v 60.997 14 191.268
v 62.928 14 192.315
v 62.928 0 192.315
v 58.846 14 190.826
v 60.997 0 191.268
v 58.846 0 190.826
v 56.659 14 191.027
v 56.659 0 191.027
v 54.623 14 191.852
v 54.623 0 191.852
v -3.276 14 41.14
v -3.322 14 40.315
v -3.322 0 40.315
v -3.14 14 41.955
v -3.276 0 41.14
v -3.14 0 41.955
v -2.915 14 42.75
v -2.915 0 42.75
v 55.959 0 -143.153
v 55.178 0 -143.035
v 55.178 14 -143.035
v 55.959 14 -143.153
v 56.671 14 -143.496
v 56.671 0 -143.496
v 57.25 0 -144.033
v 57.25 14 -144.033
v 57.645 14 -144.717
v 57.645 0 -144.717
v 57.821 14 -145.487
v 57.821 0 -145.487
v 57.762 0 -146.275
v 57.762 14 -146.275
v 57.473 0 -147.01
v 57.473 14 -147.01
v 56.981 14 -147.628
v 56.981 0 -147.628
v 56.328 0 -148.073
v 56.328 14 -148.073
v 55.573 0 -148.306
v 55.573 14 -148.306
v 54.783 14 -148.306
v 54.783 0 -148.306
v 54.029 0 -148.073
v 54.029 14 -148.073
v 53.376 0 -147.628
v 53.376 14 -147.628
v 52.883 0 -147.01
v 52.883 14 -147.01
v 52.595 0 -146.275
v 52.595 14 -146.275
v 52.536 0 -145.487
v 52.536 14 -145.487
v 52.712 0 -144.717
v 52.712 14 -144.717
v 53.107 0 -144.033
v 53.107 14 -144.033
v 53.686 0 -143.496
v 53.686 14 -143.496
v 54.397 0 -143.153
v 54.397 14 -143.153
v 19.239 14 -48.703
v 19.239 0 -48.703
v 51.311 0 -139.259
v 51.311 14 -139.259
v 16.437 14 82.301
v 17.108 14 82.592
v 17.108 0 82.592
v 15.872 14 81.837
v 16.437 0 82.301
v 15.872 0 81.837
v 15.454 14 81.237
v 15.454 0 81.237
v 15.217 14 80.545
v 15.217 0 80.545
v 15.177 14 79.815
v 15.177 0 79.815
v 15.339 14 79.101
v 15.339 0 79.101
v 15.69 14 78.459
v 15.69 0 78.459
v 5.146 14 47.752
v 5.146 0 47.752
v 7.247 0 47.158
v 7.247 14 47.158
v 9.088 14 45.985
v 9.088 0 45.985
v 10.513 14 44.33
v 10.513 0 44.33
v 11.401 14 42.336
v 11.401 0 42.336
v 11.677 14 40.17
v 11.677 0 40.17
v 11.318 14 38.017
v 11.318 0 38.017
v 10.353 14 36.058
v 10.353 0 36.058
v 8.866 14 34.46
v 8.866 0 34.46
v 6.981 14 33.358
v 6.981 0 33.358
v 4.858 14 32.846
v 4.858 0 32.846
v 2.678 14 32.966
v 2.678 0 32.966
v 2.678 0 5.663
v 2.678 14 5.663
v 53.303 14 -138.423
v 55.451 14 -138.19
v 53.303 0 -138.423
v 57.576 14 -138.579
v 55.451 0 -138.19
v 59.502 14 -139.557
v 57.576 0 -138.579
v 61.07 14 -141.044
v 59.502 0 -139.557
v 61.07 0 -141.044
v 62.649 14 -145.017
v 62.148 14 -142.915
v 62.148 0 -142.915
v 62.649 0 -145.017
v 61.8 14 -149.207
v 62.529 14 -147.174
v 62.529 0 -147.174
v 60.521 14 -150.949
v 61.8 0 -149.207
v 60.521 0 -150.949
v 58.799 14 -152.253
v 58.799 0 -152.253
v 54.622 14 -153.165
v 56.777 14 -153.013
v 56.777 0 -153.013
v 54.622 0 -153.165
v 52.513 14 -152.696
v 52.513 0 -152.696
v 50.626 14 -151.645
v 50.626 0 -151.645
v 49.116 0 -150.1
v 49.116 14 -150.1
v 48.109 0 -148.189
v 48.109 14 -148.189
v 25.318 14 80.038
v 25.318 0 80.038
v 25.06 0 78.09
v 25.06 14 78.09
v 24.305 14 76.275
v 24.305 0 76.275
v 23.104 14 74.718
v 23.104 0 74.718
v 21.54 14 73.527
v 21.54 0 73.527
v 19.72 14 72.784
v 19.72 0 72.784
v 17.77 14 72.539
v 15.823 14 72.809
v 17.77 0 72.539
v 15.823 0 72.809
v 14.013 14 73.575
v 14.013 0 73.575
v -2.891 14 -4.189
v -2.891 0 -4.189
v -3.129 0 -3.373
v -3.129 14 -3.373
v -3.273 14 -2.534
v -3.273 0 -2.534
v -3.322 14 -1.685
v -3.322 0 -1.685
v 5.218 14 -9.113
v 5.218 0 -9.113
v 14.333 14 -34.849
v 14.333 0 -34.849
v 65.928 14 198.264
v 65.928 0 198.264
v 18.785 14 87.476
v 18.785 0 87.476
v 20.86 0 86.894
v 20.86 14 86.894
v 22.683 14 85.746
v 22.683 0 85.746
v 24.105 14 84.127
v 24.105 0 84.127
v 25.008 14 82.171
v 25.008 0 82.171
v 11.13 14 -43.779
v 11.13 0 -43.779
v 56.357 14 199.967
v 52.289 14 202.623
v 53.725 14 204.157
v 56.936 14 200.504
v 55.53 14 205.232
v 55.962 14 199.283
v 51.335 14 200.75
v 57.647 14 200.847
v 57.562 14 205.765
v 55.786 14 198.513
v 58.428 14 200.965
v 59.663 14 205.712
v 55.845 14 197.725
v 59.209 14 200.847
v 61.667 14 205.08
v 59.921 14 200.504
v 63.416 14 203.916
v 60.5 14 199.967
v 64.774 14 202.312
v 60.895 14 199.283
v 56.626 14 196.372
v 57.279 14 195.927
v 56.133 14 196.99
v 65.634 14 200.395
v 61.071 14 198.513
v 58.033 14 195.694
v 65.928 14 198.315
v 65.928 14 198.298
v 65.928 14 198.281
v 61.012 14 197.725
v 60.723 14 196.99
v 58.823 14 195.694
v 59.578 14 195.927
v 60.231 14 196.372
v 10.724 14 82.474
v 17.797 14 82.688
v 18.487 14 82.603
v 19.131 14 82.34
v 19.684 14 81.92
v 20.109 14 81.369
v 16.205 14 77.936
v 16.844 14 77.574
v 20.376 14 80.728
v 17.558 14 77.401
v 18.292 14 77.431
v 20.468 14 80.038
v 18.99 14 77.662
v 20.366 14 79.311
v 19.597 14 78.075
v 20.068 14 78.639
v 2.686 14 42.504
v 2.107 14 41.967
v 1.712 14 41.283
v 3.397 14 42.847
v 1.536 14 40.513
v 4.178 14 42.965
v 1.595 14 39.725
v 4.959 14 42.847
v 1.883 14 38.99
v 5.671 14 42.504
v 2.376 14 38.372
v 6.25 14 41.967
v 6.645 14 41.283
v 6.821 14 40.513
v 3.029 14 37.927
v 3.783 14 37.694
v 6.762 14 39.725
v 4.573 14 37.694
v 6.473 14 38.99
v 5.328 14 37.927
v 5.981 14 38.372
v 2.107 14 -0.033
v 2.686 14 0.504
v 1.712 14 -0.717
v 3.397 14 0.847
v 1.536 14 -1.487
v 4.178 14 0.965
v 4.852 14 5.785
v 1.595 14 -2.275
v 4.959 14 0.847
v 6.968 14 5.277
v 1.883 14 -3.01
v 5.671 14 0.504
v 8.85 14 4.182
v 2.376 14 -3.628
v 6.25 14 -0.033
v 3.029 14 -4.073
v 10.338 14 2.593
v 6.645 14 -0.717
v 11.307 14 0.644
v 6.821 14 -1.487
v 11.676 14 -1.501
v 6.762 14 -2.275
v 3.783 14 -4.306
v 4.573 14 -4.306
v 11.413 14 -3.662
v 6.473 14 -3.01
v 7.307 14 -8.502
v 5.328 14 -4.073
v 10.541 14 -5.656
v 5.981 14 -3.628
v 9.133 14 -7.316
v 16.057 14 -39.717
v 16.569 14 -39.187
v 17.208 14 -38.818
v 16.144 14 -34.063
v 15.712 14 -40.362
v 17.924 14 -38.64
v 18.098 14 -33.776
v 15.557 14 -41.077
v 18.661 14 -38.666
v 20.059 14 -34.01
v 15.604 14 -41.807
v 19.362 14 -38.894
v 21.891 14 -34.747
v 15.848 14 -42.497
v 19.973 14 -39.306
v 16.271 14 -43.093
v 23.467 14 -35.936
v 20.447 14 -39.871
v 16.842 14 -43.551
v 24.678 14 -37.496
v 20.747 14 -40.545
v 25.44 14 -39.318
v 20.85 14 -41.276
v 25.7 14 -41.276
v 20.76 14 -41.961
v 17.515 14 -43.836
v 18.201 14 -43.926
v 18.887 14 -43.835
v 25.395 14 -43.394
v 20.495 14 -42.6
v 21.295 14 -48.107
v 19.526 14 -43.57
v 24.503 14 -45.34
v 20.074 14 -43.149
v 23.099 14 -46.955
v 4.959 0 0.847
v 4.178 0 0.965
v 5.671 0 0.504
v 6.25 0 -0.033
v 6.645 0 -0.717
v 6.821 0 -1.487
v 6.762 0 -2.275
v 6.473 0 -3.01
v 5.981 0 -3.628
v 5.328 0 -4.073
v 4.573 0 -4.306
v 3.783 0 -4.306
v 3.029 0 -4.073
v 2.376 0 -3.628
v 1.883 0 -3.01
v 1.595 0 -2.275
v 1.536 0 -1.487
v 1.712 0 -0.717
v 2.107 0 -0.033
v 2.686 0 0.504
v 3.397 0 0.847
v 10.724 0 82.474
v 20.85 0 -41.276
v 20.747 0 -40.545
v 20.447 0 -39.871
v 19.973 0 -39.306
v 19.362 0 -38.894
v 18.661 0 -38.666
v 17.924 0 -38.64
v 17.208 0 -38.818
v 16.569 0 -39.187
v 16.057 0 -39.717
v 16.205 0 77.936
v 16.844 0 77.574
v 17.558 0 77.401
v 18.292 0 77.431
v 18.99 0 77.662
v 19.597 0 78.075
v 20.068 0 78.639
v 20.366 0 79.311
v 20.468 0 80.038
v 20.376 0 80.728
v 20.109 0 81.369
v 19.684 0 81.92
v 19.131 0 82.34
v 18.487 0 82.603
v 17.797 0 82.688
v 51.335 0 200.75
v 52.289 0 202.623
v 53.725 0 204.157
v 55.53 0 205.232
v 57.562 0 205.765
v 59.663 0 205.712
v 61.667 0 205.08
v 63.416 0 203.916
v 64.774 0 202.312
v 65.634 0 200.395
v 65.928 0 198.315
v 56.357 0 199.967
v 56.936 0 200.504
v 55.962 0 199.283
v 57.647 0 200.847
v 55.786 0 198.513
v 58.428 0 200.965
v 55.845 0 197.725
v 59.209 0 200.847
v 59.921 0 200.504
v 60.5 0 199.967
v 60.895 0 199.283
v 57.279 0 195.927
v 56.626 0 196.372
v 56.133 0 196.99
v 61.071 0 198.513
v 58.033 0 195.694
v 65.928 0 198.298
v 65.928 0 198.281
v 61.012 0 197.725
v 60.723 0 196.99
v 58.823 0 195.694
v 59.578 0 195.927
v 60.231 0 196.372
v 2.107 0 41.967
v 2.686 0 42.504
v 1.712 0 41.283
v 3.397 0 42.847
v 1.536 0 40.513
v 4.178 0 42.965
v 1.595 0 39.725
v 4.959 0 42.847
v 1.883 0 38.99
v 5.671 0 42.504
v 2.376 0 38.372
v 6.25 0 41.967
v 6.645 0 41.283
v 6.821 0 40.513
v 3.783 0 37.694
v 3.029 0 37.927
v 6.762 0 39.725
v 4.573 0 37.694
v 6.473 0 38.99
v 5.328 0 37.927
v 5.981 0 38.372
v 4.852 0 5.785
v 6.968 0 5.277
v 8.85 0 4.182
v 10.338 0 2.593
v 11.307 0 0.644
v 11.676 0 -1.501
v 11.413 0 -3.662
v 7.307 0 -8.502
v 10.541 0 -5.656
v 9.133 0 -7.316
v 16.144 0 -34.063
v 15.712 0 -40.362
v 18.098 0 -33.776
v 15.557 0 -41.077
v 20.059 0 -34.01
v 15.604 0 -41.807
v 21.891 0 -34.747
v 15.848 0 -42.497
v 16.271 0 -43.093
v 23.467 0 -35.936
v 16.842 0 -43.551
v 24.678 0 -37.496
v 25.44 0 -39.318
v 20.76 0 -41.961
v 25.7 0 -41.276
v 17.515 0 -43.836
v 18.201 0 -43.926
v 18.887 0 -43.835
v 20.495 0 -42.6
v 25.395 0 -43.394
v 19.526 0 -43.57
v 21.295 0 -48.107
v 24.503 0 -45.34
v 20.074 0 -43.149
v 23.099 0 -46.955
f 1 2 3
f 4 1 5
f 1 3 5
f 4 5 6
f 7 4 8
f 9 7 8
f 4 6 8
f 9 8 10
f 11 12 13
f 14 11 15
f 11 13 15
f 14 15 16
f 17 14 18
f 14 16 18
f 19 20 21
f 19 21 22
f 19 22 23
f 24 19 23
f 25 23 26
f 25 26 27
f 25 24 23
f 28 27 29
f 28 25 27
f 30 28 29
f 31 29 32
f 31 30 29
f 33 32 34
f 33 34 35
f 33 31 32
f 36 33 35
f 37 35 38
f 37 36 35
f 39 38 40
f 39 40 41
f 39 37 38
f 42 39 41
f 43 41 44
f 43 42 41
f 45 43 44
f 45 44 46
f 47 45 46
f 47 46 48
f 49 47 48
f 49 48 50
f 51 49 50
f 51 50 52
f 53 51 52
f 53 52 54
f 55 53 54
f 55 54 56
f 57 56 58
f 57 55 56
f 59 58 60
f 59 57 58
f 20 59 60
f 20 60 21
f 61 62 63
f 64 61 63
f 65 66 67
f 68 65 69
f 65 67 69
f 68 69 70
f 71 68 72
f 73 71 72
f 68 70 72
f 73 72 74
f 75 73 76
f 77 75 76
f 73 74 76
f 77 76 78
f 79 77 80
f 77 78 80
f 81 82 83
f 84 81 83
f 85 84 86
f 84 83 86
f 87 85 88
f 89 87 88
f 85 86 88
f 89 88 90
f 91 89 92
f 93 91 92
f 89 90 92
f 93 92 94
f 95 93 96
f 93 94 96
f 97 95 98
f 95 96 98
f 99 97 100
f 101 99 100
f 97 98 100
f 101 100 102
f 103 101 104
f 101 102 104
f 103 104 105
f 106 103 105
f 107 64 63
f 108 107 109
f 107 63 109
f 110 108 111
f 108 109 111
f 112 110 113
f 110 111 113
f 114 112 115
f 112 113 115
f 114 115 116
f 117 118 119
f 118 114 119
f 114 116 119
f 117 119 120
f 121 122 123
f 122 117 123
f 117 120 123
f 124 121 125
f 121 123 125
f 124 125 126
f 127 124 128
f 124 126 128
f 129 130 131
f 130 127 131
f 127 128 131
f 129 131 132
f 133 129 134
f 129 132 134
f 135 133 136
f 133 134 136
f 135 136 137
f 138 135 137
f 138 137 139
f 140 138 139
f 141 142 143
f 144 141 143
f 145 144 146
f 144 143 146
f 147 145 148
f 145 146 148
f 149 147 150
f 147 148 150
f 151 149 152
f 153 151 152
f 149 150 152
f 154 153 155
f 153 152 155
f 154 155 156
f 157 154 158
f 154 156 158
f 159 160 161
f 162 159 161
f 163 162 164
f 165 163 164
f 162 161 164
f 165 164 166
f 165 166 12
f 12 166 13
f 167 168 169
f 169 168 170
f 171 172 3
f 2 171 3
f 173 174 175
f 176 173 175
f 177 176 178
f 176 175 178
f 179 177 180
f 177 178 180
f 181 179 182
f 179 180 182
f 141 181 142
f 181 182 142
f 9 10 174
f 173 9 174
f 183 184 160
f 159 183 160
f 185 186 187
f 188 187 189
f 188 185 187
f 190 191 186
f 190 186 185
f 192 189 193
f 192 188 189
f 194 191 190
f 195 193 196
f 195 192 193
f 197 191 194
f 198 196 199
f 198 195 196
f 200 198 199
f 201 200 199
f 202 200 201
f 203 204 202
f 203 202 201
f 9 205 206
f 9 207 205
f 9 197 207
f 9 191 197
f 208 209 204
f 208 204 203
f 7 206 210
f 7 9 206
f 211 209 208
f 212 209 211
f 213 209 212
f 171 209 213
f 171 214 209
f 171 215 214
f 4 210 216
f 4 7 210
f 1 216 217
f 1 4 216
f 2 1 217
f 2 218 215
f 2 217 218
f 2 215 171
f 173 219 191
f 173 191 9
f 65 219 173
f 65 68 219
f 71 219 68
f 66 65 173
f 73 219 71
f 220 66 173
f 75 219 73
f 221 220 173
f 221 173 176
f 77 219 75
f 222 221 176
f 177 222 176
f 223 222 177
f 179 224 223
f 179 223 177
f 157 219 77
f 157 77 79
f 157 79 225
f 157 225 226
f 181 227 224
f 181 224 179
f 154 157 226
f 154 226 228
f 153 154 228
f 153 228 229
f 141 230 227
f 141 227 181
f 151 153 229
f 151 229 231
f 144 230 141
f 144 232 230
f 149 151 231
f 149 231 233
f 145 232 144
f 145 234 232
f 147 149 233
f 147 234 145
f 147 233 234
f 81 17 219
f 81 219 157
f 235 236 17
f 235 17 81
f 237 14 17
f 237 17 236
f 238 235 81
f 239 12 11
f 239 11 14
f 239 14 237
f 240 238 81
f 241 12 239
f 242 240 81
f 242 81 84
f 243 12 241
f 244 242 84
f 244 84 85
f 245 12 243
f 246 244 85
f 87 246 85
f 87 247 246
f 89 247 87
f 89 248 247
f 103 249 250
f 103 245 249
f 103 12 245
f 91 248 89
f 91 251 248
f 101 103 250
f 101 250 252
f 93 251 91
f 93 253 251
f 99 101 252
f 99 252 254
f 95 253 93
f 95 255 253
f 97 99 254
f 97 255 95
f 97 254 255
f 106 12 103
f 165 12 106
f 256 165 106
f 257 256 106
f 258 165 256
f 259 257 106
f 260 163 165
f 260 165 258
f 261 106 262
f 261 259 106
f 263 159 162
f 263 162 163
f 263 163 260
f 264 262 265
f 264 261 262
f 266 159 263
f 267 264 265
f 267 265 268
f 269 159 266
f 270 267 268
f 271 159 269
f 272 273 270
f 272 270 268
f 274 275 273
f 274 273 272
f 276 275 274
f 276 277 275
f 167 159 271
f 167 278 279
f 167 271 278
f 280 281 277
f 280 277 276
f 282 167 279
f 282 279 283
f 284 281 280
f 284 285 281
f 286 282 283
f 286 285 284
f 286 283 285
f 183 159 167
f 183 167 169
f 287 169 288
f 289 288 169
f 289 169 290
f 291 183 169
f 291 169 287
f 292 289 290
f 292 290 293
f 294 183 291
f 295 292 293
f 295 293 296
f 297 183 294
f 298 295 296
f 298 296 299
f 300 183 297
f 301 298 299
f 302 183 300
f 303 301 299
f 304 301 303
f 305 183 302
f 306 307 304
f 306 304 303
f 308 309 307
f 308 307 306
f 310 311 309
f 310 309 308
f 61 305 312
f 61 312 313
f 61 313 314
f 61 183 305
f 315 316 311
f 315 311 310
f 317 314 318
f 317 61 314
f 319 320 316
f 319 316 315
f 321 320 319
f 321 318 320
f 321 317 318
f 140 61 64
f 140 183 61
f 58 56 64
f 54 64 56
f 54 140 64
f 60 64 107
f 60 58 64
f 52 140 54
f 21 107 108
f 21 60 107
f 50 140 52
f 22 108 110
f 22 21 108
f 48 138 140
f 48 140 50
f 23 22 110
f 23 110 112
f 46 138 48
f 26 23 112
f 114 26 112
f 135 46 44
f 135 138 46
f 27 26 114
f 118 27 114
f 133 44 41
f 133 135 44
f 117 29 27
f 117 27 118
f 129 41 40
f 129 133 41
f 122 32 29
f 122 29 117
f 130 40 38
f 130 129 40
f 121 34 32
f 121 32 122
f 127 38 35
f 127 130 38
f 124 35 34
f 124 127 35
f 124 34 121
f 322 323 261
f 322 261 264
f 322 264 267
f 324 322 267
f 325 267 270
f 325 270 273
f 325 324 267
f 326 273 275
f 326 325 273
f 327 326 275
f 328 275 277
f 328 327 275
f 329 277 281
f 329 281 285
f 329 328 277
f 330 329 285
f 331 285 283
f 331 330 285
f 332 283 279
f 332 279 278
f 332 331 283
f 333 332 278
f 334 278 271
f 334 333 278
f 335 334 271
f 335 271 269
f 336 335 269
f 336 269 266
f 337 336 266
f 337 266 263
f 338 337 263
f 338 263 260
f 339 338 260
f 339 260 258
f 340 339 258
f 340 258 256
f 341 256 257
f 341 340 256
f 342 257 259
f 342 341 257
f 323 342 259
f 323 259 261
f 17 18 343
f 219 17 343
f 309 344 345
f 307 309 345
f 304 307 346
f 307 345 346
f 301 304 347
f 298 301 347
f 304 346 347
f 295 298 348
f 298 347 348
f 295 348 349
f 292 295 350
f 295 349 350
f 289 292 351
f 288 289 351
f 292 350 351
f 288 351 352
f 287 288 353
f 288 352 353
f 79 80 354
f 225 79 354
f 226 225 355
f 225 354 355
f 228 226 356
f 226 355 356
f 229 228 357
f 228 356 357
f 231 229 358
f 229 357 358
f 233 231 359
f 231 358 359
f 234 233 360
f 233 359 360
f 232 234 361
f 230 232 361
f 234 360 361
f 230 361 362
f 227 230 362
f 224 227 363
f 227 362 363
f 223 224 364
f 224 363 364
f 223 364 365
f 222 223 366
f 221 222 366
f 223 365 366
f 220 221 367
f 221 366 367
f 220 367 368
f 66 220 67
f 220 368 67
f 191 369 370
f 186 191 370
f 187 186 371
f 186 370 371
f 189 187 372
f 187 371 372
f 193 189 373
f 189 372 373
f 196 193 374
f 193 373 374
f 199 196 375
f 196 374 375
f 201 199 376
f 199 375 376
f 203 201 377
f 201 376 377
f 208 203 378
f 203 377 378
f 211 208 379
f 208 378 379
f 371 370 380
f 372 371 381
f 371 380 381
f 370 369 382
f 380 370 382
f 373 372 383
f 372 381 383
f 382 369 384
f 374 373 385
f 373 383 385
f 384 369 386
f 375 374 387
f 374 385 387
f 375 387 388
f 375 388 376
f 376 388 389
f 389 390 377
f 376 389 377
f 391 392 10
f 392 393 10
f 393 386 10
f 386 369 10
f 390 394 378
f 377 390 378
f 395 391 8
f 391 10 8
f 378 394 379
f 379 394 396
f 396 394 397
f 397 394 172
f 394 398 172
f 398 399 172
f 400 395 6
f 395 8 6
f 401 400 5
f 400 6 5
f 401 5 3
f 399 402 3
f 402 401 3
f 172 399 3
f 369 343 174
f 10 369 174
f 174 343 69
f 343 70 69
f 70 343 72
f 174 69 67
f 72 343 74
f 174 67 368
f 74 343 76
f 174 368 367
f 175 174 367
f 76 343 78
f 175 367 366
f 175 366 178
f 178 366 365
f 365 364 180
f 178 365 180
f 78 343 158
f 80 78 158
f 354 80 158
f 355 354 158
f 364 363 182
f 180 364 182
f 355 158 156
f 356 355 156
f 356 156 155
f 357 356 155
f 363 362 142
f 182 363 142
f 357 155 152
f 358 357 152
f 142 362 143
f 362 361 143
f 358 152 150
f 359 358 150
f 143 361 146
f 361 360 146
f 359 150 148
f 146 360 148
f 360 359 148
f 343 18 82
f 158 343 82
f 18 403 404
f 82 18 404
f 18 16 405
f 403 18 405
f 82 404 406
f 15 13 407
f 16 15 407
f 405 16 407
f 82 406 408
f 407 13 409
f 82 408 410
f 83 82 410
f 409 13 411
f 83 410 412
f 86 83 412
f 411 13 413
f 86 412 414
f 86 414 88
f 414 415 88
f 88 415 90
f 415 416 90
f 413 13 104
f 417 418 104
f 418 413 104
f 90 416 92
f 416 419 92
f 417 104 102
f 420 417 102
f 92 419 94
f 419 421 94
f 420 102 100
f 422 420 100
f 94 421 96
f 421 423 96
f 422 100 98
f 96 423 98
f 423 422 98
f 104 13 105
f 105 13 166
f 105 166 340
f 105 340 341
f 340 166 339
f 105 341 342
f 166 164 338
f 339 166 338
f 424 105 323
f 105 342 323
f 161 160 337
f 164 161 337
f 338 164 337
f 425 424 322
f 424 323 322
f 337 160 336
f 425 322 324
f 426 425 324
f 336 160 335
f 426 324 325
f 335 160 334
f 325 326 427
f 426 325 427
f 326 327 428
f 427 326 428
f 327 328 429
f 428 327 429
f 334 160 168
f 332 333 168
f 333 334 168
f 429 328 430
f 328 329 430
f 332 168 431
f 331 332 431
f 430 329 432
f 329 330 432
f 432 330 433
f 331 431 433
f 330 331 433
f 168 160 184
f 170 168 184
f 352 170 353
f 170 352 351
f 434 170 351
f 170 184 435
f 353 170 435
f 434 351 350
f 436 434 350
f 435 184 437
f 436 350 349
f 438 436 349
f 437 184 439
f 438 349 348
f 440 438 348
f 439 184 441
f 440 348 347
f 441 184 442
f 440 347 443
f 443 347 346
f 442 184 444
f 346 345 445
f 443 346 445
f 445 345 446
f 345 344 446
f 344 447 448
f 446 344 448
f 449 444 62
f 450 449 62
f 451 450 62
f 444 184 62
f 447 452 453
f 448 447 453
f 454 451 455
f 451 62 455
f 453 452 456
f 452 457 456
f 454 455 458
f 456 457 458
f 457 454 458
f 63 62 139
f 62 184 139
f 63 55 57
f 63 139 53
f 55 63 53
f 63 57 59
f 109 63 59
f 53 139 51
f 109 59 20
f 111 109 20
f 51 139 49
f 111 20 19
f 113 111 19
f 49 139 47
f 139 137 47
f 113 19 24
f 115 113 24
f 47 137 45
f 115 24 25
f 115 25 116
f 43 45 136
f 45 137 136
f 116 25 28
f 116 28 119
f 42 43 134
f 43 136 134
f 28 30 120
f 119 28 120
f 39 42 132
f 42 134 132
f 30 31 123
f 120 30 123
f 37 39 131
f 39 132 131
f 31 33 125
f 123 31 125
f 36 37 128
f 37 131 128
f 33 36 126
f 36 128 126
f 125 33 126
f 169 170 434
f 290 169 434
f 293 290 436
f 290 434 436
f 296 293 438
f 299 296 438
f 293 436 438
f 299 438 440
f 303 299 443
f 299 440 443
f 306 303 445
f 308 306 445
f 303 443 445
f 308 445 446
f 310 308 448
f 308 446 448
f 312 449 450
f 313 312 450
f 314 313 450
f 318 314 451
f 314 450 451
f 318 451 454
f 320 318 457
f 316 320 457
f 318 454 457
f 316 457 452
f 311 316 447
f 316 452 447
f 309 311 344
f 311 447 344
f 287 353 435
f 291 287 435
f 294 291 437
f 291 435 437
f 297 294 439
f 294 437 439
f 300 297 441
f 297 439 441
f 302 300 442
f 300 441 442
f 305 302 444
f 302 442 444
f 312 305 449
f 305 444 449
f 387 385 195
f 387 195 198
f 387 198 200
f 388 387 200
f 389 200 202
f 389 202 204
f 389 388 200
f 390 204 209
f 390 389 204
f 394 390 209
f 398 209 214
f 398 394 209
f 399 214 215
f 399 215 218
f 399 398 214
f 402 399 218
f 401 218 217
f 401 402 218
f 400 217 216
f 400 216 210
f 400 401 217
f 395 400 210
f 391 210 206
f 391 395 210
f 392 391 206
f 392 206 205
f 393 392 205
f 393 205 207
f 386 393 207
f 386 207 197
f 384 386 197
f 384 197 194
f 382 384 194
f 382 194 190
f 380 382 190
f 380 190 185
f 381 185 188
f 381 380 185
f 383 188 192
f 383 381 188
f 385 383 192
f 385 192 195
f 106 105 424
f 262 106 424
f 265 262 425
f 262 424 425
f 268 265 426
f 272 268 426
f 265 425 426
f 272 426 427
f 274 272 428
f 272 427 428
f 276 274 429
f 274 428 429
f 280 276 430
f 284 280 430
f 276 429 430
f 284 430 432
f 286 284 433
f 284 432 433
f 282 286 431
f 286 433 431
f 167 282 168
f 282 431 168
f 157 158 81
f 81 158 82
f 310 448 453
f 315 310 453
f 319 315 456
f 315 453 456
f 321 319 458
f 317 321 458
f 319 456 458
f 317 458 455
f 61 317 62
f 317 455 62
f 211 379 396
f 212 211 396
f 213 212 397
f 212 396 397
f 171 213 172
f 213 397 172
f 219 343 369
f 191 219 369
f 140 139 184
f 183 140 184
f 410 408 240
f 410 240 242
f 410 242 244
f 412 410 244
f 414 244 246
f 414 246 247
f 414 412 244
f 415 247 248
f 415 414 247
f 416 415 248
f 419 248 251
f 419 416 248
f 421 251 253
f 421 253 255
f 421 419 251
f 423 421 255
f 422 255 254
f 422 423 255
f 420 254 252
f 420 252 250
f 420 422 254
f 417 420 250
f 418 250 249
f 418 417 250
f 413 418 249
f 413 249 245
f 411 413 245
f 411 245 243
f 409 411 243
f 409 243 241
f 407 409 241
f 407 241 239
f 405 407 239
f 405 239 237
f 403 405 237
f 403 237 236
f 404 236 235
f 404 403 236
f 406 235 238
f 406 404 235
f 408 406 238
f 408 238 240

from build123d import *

# Parameters (mm, degrees)
SKETCH1_R           = 2.65
SKETCH1_R_2         = 7.5
BOSS_EXTRUDE2_DEPTH = 14


with BuildPart() as part:
    # Sketch1 → Boss-Extrude2 (new body)
    # profile 1 of 17: a face of its own
    with BuildSketch(Plane(origin=(0, 0, 0), x_dir=(1, 0, 0), z_dir=(0, 1, 0))):
        with BuildLine():
            ThreePointArc((54.623301063, -191.851720312), (51.393371136, -195.715064378), (51.3348715, -200.750384875))
            ThreePointArc((51.3348715, -200.750384875), (59.663021267, -205.712476174), (65.928383174, -198.314796214))
            ThreePointArc((65.928383174, -198.314796214), (65.928340244, -198.289420057), (65.928211455, -198.26404419))
            Line((65.928211455, -198.26404419), (62.928383174, -192.314796214))
            ThreePointArc((62.928383174, -192.314796214), (58.845920647, -190.826427737), (54.623301063, -191.851720312))
        make_face()
        with Locations(Location((58.428383174, -198.314796214, 0), (0, 0, 270))):
            Circle(SKETCH1_R, mode=Mode.SUBTRACT)
    # profile 2 of 17: a face of its own
    with BuildSketch(Plane(origin=(0, 0, 0), x_dir=(1, 0, 0), z_dir=(0, 1, 0))):
        with BuildLine():
            ThreePointArc((18.785357114, -87.475772959), (13.863470513, -86.411391053), (10.724167872, -82.474049884))
            Line((10.724167872, -82.474049884), (51.3348715, -200.750384875))
            ThreePointArc((51.3348715, -200.750384875), (51.393371136, -195.715064378), (54.623301063, -191.851720312))
            Line((54.623301063, -191.851720312), (18.785357114, -87.475772959))
        make_face()
    # profile 3 of 17: a face of its own
    with BuildSketch(Plane(origin=(0, 0, 0), x_dir=(1, 0, 0), z_dir=(0, 1, 0))):
        with BuildLine():
            ThreePointArc((14.012597561, -73.575385689), (10.782667702, -77.438729573), (10.724167872, -82.474049884))
            ThreePointArc((10.724167872, -82.474049884), (13.863470513, -86.411391053), (18.785357114, -87.475772959))
            Line((18.785357114, -87.475772959), (17.1084173, -82.591782349))
            ThreePointArc((17.1084173, -82.591782349), (15.311305548, -80.899036252), (15.689537375, -78.459376299))
            Line((15.689537375, -78.459376299), (14.012597561, -73.575385689))
        make_face()
    # profile 4 of 17: a face of its own
    with BuildSketch(Plane(origin=(0, 0, 0), x_dir=(1, 0, 0), z_dir=(0, 1, 0))):
        with BuildLine():
            ThreePointArc((25.317679673, -80.038461592), (21.540036733, -73.527389644), (14.012597561, -73.575385689))
            Line((14.012597561, -73.575385689), (15.689537375, -78.459376299))
            ThreePointArc((15.689537375, -78.459376299), (18.649221287, -77.522306083), (20.467679673, -80.038461592))
            ThreePointArc((20.467679673, -80.038461592), (19.421262336, -82.148206279), (17.1084173, -82.591782349))
            Line((17.1084173, -82.591782349), (18.785357114, -87.475772959))
            ThreePointArc((18.785357114, -87.475772959), (23.452729842, -84.987826157), (25.317679673, -80.038461592))
        make_face()
    # profile 5 of 17: a face of its own
    with BuildSketch(Plane(origin=(0, 0, 0), x_dir=(1, 0, 0), z_dir=(0, 1, 0))):
        with BuildLine():
            ThreePointArc((14.012597561, -73.575385689), (10.782667702, -77.438729573), (10.724167872, -82.474049884))
            ThreePointArc((10.724167872, -82.474049884), (13.863470513, -86.411391053), (18.785357114, -87.475772959))
            Line((18.785357114, -87.475772959), (17.1084173, -82.591782349))
            ThreePointArc((17.1084173, -82.591782349), (15.311305548, -80.899036252), (15.689537375, -78.459376299))
            Line((15.689537375, -78.459376299), (14.012597561, -73.575385689))
        make_face()
    # profile 6 of 17: a face of its own
    with BuildSketch(Plane(origin=(0, 0, 0), x_dir=(1, 0, 0), z_dir=(0, 1, 0))):
        with BuildLine():
            ThreePointArc((25.317679673, -80.038461592), (21.540036733, -73.527389644), (14.012597561, -73.575385689))
            Line((14.012597561, -73.575385689), (15.689537375, -78.459376299))
            ThreePointArc((15.689537375, -78.459376299), (18.649221287, -77.522306083), (20.467679673, -80.038461592))
            ThreePointArc((20.467679673, -80.038461592), (19.421262336, -82.148206279), (17.1084173, -82.591782349))
            Line((17.1084173, -82.591782349), (18.785357114, -87.475772959))
            ThreePointArc((18.785357114, -87.475772959), (23.452729842, -84.987826157), (25.317679673, -80.038461592))
        make_face()
    # profile 7 of 17: a face of its own
    with BuildSketch(Plane(origin=(0, 0, 0), x_dir=(1, 0, 0), z_dir=(0, 1, 0))):
        with BuildLine():
            ThreePointArc((5.146060616, -47.752107581), (0.22417418, -46.687725778), (-2.9151285, -42.750384875))
            Line((-2.9151285, -42.750384875), (10.724167872, -82.474049884))
            ThreePointArc((10.724167872, -82.474049884), (10.782667702, -77.438729573), (14.012597561, -73.575385689))
            Line((14.012597561, -73.575385689), (5.146060616, -47.752107581))
        make_face()
    # profile 8 of 17: a face of its own
    with BuildSketch(Plane(origin=(0, 0, 0), x_dir=(1, 0, 0), z_dir=(0, 1, 0))):
        with Locations((4.178383174, -40.314796214)):
            Circle(SKETCH1_R_2)
        with Locations(Location((4.178383174, -40.314796214, 0), (0, 0, 270))):
            Circle(SKETCH1_R, mode=Mode.SUBTRACT)
    # profile 9 of 17: a face of its own
    with BuildSketch(Plane(origin=(0, 0, 0), x_dir=(1, 0, 0), z_dir=(0, 1, 0))):
        with BuildLine():
            ThreePointArc((2.678383174, -5.663265443), (-1.631091845, -3.058212705), (-3.321616826, 1.685203786))
            Line((-3.321616826, 1.685203786), (-3.321616826, -40.314796214))
            ThreePointArc((-3.321616826, -40.314796214), (-1.631091845, -35.571379724), (2.678383174, -32.966326986))
            Line((2.678383174, -32.966326986), (2.678383174, -5.663265443))
        make_face()
    # profile 10 of 17: a face of its own
    with BuildSketch(Plane(origin=(0, 0, 0), x_dir=(1, 0, 0), z_dir=(0, 1, 0))):
        with Locations((4.178383174, 1.685203786)):
            Circle(SKETCH1_R_2)
        with Locations(Location((4.178383174, 1.685203786, 0), (0, 0, 270))):
            Circle(SKETCH1_R, mode=Mode.SUBTRACT)
    # profile 11 of 17: a face of its own
    with BuildSketch(Plane(origin=(0, 0, 0), x_dir=(1, 0, 0), z_dir=(0, 1, 0))):
        with BuildLine():
            ThreePointArc((14.332756859, 34.849450798), (11.140217836, 38.743750227), (11.130258872, 43.77940056))
            Line((11.130258872, 43.77940056), (-2.891321014, 4.189057352))
            ThreePointArc((-2.891321014, 4.189057352), (0.285789897, 8.095953943), (5.217707788, 9.112841657))
            Line((5.217707788, 9.112841657), (14.332756859, 34.849450798))
        make_face()
    # profile 12 of 17: a face of its own
    with BuildSketch(Plane(origin=(0, 0, 0), x_dir=(1, 0, 0), z_dir=(0, 1, 0))):
        with BuildLine():
            ThreePointArc((19.239287763, 48.703185114), (14.307369759, 47.686297331), (11.130258872, 43.77940056))
            ThreePointArc((11.130258872, 43.77940056), (11.140217836, 38.743750227), (14.332756859, 34.849450798))
            Line((14.332756859, 34.849450798), (16.056698099, 39.717049592))
            ThreePointArc((16.056698099, 39.717049592), (15.702001002, 42.160242169), (17.515346523, 43.835586319))
            Line((17.515346523, 43.835586319), (19.239287763, 48.703185114))
        make_face()
    # profile 13 of 17: a face of its own
    with BuildSketch(Plane(origin=(0, 0, 0), x_dir=(1, 0, 0), z_dir=(0, 1, 0))):
        with BuildLine():
            ThreePointArc((25.699963149, 41.275547242), (23.858802898, 46.197694406), (19.239287763, 48.703185114))
            Line((19.239287763, 48.703185114), (17.515346523, 43.835586319))
            ThreePointArc((17.515346523, 43.835586319), (19.813695769, 43.377538448), (20.849963149, 41.275547242))
            ThreePointArc((20.849963149, 41.275547242), (19.019367694, 38.755413081), (16.056698099, 39.717049592))
            Line((16.056698099, 39.717049592), (14.332756859, 34.849450798))
            ThreePointArc((14.332756859, 34.849450798), (21.890894795, 34.746609841), (25.699963149, 41.275547242))
        make_face()
    # profile 14 of 17: a face of its own
    with BuildSketch(Plane(origin=(0, 0, 0), x_dir=(1, 0, 0), z_dir=(0, 1, 0))):
        with BuildLine():
            ThreePointArc((19.239287763, 48.703185114), (14.307369759, 47.686297331), (11.130258872, 43.77940056))
            ThreePointArc((11.130258872, 43.77940056), (11.140217836, 38.743750227), (14.332756859, 34.849450798))
            Line((14.332756859, 34.849450798), (16.056698099, 39.717049592))
            ThreePointArc((16.056698099, 39.717049592), (15.702001002, 42.160242169), (17.515346523, 43.835586319))
            Line((17.515346523, 43.835586319), (19.239287763, 48.703185114))
        make_face()
    # profile 15 of 17: a face of its own
    with BuildSketch(Plane(origin=(0, 0, 0), x_dir=(1, 0, 0), z_dir=(0, 1, 0))):
        with BuildLine():
            ThreePointArc((25.699963149, 41.275547242), (23.858802898, 46.197694406), (19.239287763, 48.703185114))
            Line((19.239287763, 48.703185114), (17.515346523, 43.835586319))
            ThreePointArc((17.515346523, 43.835586319), (19.813695769, 43.377538448), (20.849963149, 41.275547242))
            ThreePointArc((20.849963149, 41.275547242), (19.019367694, 38.755413081), (16.056698099, 39.717049592))
            Line((16.056698099, 39.717049592), (14.332756859, 34.849450798))
            ThreePointArc((14.332756859, 34.849450798), (21.890894795, 34.746609841), (25.699963149, 41.275547242))
        make_face()
    # profile 16 of 17: a face of its own
    with BuildSketch(Plane(origin=(0, 0, 0), x_dir=(1, 0, 0), z_dir=(0, 1, 0))):
        with BuildLine():
            ThreePointArc((51.311176885, 139.259107341), (48.118637818, 143.153406895), (48.108678986, 148.189057352))
            Line((48.108678986, 148.189057352), (11.130258872, 43.77940056))
            ThreePointArc((11.130258872, 43.77940056), (14.307369759, 47.686297331), (19.239287763, 48.703185114))
            Line((19.239287763, 48.703185114), (51.311176885, 139.259107341))
        make_face()
    # profile 17 of 17: a face of its own
    with BuildSketch(Plane(origin=(0, 0, 0), x_dir=(1, 0, 0), z_dir=(0, 1, 0))):
        with Locations((55.178383174, 145.685203786)):
            Circle(SKETCH1_R_2)
        with Locations(Location((55.178383174, 145.685203786, 0), (0, 0, 270))):
            Circle(SKETCH1_R, mode=Mode.SUBTRACT)
    extrude(amount=BOSS_EXTRUDE2_DEPTH)


solid = part.part
